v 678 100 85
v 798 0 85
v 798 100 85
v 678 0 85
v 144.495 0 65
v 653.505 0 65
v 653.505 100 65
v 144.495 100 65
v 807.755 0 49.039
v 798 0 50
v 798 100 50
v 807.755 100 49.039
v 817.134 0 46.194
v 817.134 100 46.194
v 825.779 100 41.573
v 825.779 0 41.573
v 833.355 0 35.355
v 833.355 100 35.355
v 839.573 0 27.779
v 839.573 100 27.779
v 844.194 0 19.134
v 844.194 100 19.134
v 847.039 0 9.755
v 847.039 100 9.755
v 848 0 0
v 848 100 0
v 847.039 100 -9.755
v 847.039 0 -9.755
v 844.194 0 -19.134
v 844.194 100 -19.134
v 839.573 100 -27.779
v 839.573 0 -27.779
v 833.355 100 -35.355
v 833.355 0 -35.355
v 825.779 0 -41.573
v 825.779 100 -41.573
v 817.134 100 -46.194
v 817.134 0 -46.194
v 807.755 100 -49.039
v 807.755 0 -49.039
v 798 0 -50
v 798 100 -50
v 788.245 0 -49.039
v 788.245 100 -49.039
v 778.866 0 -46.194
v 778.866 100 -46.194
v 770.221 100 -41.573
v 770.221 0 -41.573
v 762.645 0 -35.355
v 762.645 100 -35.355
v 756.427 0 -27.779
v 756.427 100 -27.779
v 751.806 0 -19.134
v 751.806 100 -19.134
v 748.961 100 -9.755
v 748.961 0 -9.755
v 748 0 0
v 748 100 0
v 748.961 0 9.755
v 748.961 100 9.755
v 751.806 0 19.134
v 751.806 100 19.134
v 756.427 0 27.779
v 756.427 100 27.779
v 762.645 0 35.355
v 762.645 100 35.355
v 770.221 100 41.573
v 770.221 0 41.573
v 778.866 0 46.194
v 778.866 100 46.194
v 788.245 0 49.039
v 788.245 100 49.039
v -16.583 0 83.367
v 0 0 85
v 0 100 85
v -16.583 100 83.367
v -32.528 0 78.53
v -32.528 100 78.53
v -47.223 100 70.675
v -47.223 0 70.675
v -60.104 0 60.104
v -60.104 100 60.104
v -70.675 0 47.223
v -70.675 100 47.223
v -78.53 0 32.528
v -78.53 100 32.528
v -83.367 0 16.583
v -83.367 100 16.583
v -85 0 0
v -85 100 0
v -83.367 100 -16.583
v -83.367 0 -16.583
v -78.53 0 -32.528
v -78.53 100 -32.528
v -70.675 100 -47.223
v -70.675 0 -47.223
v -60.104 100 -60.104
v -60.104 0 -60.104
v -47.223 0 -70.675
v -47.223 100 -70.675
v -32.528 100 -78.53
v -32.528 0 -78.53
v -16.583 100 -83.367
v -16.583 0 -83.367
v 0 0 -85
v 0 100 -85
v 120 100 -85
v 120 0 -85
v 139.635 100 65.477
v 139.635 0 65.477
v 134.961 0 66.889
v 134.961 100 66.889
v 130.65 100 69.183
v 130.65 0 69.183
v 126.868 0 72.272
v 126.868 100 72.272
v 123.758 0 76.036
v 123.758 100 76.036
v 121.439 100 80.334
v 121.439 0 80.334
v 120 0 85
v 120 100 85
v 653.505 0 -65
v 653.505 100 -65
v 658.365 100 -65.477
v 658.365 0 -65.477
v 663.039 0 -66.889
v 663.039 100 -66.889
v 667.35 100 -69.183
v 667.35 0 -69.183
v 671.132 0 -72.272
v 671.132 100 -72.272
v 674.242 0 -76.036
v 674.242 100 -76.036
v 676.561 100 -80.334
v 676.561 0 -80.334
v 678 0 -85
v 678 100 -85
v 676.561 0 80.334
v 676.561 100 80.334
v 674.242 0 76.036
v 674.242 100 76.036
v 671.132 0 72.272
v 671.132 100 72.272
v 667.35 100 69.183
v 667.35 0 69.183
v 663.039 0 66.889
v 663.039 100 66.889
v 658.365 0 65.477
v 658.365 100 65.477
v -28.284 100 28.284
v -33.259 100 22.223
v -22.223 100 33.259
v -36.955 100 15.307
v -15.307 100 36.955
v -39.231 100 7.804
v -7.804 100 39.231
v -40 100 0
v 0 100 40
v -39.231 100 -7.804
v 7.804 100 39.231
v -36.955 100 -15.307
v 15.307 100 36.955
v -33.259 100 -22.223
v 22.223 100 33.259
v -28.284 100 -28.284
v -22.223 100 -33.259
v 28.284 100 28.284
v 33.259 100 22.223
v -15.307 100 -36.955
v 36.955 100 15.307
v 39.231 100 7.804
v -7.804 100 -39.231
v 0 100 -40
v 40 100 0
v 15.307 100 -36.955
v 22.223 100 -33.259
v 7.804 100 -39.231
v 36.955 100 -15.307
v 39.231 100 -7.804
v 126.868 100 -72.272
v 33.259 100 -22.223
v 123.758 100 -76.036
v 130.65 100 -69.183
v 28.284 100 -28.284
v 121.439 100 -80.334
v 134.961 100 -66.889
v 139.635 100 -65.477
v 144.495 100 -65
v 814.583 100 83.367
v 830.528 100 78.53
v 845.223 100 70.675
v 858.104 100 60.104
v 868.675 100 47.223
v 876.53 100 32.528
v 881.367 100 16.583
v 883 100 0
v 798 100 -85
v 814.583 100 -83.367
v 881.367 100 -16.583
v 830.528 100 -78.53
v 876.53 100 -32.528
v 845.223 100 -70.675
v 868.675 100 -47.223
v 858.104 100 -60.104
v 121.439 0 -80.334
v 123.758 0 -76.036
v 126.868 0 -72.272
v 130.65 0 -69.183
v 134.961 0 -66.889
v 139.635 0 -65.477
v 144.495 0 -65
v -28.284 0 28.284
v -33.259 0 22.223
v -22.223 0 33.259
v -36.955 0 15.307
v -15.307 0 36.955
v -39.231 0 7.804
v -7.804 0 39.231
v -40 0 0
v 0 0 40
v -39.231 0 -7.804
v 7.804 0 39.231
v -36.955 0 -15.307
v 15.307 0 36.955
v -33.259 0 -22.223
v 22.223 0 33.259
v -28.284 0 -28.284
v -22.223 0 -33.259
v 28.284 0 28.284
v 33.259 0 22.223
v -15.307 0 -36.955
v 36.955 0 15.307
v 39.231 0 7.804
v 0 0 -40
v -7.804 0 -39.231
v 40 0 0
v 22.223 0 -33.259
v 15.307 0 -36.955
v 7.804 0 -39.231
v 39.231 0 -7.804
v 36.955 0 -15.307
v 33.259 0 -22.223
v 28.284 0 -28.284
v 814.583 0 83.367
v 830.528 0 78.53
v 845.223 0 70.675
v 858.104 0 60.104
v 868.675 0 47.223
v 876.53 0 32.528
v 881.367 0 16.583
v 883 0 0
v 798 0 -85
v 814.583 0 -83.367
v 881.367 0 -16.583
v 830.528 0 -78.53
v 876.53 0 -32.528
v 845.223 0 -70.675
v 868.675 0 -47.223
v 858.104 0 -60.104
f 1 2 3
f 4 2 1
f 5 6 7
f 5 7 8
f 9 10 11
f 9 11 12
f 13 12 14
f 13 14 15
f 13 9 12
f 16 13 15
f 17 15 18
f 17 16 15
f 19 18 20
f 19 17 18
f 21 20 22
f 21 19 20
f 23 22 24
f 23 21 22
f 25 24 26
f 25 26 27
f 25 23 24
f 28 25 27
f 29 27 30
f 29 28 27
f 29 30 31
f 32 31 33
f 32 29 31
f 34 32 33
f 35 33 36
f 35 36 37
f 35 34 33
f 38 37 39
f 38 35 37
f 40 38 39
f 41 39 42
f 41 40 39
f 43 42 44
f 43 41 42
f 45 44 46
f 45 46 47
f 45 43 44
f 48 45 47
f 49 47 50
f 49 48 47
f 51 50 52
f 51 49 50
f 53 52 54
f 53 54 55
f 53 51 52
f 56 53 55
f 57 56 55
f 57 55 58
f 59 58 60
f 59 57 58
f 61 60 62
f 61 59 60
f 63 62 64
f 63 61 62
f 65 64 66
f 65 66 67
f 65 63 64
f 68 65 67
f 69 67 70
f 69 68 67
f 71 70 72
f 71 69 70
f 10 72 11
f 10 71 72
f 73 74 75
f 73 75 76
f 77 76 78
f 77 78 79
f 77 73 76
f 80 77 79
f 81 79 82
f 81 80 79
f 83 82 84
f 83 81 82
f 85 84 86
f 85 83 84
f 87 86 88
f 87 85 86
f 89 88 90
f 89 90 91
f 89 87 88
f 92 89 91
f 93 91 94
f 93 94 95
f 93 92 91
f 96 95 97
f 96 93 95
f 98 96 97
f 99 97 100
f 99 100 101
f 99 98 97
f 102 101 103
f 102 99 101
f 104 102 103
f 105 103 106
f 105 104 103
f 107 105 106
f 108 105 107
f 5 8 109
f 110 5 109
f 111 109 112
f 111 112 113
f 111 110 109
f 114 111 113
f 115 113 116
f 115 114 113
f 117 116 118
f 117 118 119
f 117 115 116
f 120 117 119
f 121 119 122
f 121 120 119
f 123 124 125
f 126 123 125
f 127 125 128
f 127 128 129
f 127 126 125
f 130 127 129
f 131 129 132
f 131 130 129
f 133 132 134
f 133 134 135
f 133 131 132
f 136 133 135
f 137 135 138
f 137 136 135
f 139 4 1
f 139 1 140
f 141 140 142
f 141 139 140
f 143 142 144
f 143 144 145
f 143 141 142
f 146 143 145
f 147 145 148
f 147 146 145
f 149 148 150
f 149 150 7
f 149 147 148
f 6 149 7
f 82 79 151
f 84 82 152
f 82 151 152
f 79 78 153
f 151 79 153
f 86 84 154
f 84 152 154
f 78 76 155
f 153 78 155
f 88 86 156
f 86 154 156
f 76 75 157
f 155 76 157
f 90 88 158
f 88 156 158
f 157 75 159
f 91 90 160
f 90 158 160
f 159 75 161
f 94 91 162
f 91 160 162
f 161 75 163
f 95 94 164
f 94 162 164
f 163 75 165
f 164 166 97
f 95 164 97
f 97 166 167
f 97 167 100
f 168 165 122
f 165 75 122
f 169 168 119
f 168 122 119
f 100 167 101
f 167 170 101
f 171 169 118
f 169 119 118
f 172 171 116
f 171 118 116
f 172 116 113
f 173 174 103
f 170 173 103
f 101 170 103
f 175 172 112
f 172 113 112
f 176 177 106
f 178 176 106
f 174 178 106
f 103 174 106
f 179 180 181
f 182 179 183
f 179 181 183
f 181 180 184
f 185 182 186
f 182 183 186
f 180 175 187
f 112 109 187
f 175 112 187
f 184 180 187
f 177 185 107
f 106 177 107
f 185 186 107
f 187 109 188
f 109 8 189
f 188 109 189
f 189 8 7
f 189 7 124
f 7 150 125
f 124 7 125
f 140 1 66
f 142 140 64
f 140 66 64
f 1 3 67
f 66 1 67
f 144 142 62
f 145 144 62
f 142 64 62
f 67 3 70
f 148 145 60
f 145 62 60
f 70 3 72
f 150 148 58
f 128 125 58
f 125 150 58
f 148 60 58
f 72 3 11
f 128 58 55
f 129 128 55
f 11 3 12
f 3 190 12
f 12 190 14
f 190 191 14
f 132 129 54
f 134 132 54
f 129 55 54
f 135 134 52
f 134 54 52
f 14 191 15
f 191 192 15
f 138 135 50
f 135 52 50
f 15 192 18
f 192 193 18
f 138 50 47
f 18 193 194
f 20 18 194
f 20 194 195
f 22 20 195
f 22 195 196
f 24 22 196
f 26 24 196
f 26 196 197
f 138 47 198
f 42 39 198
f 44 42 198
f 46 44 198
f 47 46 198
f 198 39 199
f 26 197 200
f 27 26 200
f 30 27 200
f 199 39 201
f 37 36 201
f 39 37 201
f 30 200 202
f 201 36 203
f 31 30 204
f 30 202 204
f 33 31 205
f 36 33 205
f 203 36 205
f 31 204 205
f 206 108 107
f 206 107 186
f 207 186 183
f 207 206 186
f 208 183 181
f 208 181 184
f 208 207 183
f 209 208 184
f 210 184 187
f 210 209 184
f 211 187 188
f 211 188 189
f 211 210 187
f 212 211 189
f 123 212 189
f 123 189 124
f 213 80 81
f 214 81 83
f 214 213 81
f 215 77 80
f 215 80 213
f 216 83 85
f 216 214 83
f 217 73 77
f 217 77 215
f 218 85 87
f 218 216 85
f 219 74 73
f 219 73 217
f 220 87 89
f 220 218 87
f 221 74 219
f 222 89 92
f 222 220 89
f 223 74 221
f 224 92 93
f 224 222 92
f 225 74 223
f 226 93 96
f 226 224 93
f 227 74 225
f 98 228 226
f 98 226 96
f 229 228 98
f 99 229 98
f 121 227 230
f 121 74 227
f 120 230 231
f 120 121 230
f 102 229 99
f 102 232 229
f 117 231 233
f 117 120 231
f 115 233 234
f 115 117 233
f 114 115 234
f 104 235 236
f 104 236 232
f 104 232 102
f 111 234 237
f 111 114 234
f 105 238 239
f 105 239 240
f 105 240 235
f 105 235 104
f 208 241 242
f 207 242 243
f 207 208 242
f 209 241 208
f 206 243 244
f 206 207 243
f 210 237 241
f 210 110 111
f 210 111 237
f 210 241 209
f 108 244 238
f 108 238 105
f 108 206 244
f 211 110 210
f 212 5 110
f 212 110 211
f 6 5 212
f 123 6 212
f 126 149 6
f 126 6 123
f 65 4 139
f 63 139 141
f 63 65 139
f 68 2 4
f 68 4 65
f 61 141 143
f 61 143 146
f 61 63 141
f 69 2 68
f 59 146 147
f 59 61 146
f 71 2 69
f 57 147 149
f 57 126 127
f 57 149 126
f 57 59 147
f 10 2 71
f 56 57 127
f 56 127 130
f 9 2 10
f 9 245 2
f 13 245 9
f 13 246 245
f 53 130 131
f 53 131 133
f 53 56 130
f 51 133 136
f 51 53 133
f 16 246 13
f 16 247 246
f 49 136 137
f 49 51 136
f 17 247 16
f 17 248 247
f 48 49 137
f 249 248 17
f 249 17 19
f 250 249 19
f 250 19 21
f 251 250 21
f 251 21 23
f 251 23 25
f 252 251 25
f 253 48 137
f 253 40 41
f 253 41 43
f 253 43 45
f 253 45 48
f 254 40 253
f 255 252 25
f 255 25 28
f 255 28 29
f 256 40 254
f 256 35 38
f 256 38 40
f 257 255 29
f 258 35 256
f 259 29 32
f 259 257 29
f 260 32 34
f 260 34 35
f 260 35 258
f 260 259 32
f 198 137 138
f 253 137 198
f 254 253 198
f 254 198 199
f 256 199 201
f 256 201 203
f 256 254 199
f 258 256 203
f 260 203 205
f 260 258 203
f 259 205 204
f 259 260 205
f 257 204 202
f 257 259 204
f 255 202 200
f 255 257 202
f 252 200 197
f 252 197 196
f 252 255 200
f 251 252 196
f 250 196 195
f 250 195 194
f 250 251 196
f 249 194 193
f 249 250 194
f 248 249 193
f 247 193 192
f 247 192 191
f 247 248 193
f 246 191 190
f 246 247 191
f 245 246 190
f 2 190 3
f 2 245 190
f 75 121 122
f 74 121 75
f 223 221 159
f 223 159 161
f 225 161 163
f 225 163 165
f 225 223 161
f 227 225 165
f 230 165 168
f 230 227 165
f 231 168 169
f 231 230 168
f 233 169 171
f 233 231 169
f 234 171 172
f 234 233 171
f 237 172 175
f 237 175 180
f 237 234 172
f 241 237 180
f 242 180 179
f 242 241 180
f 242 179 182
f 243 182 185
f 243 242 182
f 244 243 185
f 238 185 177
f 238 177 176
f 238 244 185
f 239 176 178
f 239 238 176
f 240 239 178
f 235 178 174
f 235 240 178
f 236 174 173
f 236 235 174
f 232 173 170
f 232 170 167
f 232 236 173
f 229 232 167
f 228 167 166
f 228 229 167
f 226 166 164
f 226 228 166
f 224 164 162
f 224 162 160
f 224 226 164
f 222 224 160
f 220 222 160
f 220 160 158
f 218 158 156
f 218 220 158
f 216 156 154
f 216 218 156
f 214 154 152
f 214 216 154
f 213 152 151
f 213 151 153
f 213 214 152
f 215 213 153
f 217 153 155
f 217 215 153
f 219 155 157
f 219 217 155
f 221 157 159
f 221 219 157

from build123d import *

# Parameters (mm, degrees)
SKETCH1_R           = 50
SKETCH1_R_2         = 40
BOSS_EXTRUDE1_DEPTH = 100
FILLET1_R           = 25


with BuildPart() as part:
    # Sketch1 → Boss-Extrude1 (new body)
    with BuildSketch(Plane(origin=(0, 0, 0), x_dir=(1, 0, 0), z_dir=(0, 1, 0))):
        with BuildLine():
            Line((120, 85), (120, 65))
            Line((120, 65), (678, 65))
            Line((678, 65), (678, 85))
            Line((678, 85), (798, 85))
            ThreePointArc((798, 85), (883, 0), (798, -85))
            Line((798, -85), (678, -85))
            Line((678, -85), (678, -65))
            Line((678, -65), (120, -65))
            Line((120, -65), (120, -85))
            Line((120, -85), (0, -85))
            ThreePointArc((0, -85), (-85, 0), (0, 85))
            Line((0, 85), (120, 85))
        make_face()
        with Locations(Location((798, 0, 0), (0, 0, 270))):
            Circle(SKETCH1_R, mode=Mode.SUBTRACT)
        with Locations(Location((0, 0, 0), (0, 0, 270))):
            Circle(SKETCH1_R_2, mode=Mode.SUBTRACT)
    extrude(amount=BOSS_EXTRUDE1_DEPTH)

    # Fillet1
    # the kernel refuses this fillet: 25 mm, written as the material it adds along each edge
    with BuildSketch(Plane(origin=(120, 0, 65), x_dir=(1, 0, 0), z_dir=(0, 1, 0)), Plane(origin=(678, 0, -65), x_dir=(-1, 0, 0), z_dir=(0, 1, 0))) as fillet1_piece_1:
        with BuildLine():
            CenterArc((24.494897428, -25), FILLET1_R, 90, 78.463040967)
            Line((0, -20), (-0.489897949, -19.9))
            ThreePointArc((-0.489897949, -19.9), (-0.5, -10), (-0.5, 0))
            Line((-0.5, 0), (0, 0.5))
            Line((0, 0.5), (24.494897428, 0.5))
            Line((24.494897428, 0.5), (24.494897428, 0))
        make_face()
    extrude(amount=100)
    with BuildSketch(Plane(origin=(678, 0, 65), x_dir=(0, 0, 1), z_dir=(0, 1, 0)), Plane(origin=(120, 0, -65), x_dir=(0, 0, -1), z_dir=(0, 1, 0))) as fillet1_piece_2:
        with BuildLine():
            CenterArc((25, -24.494897428), FILLET1_R, 101.536959033, 78.463040967)
            Line((0, -24.494897428), (-0.5, -24.494897428))
            Line((-0.5, -24.494897428), (-0.5, 0))
            Line((-0.5, 0), (0, 0.5))
            ThreePointArc((0, 0.5), (10, 0.5), (19.9, 0.489897949))
            Line((19.9, 0.489897949), (20, 0))
        make_face()
    extrude(amount=100)


solid = part.part
